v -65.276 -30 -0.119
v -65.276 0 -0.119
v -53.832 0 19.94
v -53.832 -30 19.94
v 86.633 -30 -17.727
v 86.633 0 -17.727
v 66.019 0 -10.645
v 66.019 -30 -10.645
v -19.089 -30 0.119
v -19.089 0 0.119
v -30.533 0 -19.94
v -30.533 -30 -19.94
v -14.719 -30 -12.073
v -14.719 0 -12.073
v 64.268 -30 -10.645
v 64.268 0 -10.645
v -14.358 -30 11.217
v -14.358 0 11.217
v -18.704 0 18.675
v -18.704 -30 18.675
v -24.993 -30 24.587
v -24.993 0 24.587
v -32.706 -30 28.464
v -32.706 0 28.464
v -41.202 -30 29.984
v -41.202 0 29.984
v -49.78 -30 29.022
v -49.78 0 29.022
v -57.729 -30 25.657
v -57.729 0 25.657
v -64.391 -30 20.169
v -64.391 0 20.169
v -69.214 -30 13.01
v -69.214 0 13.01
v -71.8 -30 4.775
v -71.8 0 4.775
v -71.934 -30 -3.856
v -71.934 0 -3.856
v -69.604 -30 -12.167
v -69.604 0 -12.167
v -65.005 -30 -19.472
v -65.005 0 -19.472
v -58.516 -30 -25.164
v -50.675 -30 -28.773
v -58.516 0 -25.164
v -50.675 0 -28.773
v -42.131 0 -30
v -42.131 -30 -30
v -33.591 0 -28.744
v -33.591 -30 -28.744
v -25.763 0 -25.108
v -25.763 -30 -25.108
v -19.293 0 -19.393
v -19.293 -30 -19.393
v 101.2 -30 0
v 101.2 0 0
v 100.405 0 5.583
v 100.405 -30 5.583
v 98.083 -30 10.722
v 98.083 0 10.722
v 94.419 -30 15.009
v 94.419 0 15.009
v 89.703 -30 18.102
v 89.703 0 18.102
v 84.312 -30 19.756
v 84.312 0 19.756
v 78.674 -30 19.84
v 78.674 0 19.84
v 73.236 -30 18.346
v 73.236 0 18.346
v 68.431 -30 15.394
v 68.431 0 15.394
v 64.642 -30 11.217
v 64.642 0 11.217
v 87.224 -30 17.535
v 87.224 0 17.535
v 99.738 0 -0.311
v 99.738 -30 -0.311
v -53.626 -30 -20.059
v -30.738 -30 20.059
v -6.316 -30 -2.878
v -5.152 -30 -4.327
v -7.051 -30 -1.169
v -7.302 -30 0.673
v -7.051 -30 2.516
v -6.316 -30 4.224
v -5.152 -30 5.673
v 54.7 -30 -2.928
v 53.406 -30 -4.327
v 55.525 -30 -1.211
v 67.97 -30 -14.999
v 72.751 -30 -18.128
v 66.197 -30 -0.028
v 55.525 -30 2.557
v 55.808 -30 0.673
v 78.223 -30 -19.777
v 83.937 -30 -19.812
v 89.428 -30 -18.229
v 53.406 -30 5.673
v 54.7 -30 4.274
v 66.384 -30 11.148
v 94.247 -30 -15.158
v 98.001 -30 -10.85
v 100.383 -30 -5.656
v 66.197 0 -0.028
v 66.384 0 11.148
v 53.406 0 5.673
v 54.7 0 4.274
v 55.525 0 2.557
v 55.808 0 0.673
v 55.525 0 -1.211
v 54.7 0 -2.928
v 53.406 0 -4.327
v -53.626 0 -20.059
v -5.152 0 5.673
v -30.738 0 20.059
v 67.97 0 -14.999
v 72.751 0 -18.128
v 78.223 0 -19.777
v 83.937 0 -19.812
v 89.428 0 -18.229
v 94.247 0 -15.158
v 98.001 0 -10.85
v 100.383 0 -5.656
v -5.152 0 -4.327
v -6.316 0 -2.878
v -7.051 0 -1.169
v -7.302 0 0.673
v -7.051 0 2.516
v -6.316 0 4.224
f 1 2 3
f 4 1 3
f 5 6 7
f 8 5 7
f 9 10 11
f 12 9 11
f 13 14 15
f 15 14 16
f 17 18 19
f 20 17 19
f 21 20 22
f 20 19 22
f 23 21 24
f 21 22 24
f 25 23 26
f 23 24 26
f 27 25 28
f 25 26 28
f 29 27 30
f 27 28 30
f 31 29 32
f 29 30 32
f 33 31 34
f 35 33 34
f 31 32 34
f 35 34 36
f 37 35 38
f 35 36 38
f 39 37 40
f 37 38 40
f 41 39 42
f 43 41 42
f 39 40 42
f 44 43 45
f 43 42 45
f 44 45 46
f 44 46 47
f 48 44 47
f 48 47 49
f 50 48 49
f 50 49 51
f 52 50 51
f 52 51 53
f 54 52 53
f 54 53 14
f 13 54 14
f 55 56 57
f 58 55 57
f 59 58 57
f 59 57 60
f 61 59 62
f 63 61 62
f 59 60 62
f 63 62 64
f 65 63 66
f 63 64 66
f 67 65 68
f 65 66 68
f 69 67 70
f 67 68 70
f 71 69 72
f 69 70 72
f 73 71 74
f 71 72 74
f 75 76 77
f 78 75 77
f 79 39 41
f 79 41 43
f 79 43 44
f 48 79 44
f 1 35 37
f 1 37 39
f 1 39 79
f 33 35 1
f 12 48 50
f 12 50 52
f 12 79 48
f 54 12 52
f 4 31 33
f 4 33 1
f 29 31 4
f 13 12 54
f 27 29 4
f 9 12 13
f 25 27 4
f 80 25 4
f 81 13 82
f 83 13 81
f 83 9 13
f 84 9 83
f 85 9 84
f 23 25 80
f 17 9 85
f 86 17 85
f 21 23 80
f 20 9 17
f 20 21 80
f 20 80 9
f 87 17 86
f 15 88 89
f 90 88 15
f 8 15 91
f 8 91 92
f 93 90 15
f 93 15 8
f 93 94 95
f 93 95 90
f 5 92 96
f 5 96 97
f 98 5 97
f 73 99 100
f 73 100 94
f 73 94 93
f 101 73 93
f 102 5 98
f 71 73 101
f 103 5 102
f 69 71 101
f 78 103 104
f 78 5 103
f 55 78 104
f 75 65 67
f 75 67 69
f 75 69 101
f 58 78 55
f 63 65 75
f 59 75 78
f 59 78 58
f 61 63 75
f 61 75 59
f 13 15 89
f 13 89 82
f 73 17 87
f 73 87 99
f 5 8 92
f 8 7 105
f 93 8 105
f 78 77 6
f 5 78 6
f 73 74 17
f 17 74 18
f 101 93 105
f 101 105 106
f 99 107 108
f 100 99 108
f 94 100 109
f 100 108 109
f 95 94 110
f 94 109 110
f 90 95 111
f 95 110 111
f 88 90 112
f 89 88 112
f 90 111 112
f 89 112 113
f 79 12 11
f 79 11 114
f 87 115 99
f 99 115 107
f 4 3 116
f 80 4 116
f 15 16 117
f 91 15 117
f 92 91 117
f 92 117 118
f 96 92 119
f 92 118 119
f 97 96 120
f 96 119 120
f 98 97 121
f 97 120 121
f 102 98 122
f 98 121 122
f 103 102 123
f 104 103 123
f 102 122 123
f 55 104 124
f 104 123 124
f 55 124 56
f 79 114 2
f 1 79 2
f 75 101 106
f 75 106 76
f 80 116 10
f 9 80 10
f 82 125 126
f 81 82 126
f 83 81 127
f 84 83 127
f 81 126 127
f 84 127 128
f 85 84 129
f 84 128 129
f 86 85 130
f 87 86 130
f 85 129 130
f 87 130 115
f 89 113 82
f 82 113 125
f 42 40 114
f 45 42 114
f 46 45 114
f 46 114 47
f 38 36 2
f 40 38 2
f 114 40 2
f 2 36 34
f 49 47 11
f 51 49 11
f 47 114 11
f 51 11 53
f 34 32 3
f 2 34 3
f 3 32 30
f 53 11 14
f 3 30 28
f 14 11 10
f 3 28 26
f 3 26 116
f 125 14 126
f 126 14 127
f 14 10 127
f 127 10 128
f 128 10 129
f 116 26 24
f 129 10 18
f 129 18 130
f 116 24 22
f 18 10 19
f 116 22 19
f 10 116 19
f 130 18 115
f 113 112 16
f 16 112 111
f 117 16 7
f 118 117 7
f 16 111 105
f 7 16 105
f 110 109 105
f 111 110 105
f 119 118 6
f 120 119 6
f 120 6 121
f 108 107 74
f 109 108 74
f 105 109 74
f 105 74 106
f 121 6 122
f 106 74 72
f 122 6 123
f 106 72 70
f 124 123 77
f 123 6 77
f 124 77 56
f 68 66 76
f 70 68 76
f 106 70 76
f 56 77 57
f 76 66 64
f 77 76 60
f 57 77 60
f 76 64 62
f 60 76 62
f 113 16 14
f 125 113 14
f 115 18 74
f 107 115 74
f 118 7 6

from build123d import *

# Parameters (mm, degrees)
F1_DEPTH = 30


with BuildPart() as f1:
    # F0 (on Front) → F1 (new body)
    with BuildSketch(Plane.XZ):
        with BuildLine():
            ThreePointArc((-14.7189177922, -12.0731056636), (-12.8233398948, -6.168347743), (-12.1823502003, 0))
            ThreePointArc((-12.1823502003, 0), (-12.7313900211, 5.7132254045), (-14.3584131685, 11.2173315922))
            ThreePointArc((-14.3584131685, 11.2173315922), (-72.178757015, 0.4643040074), (-14.7189177922, -12.0731056636))
        make_face()
        Polygon((-30.7383209178, 20.0591008551), (-19.0886446415, 0.1187303472), (-30.532673924, -19.9403705079), (-53.6263794829, -20.0591008551), (-65.2760557592, -0.1187303472), (-53.8320264766, 19.9403705079), align=None, mode=Mode.SUBTRACT)
        with BuildLine():
            ThreePointArc((-14.3584131685, 11.2173315922), (-12.7313900211, 5.7132254045), (-12.1823502003, 0))
            ThreePointArc((-12.1823502003, 0), (-12.8233398948, -6.168347743), (-14.7189177922, -12.0731056636))
            Line((-14.7189177922, -12.0731056636), (64.2681791355, -10.6453385498))
            ThreePointArc((64.2681791355, -10.6453385498), (61.2026273995, 0.3415440484), (64.6415868315, 11.2173315922))
            Line((64.6415868315, 11.2173315922), (-14.3584131685, 11.2173315922))
        make_face()
        with BuildLine():
            ThreePointArc((-5.1515232772, -4.3269232847), (-7.3021761652, 0.6730767153), (-5.1515232772, 5.6730767153))
            Line((-5.1515232772, 5.6730767153), (53.4061715007, 5.6730767153))
            ThreePointArc((53.4061715007, 5.6730767153), (55.808235454, 0.6730767153), (53.4061715007, -4.3269232847))
            Line((53.4061715007, -4.3269232847), (-5.1515232772, -4.3269232847))
        make_face(mode=Mode.SUBTRACT)
        with BuildLine():
            ThreePointArc((101.1997108784, 0), (87.0664612166, 19.1201788817), (64.6415868315, 11.2173315922))
            ThreePointArc((64.6415868315, 11.2173315922), (61.2026273995, 0.3415440484), (64.2681791355, -10.6453385498))
            ThreePointArc((64.2681791355, -10.6453385498), (86.7390865265, -19.2175783445), (101.1997108784, 0))
        make_face()
        Polygon((87.223782972, 17.5351066588), (99.7381289824, -0.3105870635), (86.6330112708, -17.7270600205), (66.0192570879, -10.6453385498), (66.1971306066, -0.0283681482), (66.3843740788, 11.147878975), align=None, mode=Mode.SUBTRACT)
    extrude(amount=F1_DEPTH)


solid = f1.part
